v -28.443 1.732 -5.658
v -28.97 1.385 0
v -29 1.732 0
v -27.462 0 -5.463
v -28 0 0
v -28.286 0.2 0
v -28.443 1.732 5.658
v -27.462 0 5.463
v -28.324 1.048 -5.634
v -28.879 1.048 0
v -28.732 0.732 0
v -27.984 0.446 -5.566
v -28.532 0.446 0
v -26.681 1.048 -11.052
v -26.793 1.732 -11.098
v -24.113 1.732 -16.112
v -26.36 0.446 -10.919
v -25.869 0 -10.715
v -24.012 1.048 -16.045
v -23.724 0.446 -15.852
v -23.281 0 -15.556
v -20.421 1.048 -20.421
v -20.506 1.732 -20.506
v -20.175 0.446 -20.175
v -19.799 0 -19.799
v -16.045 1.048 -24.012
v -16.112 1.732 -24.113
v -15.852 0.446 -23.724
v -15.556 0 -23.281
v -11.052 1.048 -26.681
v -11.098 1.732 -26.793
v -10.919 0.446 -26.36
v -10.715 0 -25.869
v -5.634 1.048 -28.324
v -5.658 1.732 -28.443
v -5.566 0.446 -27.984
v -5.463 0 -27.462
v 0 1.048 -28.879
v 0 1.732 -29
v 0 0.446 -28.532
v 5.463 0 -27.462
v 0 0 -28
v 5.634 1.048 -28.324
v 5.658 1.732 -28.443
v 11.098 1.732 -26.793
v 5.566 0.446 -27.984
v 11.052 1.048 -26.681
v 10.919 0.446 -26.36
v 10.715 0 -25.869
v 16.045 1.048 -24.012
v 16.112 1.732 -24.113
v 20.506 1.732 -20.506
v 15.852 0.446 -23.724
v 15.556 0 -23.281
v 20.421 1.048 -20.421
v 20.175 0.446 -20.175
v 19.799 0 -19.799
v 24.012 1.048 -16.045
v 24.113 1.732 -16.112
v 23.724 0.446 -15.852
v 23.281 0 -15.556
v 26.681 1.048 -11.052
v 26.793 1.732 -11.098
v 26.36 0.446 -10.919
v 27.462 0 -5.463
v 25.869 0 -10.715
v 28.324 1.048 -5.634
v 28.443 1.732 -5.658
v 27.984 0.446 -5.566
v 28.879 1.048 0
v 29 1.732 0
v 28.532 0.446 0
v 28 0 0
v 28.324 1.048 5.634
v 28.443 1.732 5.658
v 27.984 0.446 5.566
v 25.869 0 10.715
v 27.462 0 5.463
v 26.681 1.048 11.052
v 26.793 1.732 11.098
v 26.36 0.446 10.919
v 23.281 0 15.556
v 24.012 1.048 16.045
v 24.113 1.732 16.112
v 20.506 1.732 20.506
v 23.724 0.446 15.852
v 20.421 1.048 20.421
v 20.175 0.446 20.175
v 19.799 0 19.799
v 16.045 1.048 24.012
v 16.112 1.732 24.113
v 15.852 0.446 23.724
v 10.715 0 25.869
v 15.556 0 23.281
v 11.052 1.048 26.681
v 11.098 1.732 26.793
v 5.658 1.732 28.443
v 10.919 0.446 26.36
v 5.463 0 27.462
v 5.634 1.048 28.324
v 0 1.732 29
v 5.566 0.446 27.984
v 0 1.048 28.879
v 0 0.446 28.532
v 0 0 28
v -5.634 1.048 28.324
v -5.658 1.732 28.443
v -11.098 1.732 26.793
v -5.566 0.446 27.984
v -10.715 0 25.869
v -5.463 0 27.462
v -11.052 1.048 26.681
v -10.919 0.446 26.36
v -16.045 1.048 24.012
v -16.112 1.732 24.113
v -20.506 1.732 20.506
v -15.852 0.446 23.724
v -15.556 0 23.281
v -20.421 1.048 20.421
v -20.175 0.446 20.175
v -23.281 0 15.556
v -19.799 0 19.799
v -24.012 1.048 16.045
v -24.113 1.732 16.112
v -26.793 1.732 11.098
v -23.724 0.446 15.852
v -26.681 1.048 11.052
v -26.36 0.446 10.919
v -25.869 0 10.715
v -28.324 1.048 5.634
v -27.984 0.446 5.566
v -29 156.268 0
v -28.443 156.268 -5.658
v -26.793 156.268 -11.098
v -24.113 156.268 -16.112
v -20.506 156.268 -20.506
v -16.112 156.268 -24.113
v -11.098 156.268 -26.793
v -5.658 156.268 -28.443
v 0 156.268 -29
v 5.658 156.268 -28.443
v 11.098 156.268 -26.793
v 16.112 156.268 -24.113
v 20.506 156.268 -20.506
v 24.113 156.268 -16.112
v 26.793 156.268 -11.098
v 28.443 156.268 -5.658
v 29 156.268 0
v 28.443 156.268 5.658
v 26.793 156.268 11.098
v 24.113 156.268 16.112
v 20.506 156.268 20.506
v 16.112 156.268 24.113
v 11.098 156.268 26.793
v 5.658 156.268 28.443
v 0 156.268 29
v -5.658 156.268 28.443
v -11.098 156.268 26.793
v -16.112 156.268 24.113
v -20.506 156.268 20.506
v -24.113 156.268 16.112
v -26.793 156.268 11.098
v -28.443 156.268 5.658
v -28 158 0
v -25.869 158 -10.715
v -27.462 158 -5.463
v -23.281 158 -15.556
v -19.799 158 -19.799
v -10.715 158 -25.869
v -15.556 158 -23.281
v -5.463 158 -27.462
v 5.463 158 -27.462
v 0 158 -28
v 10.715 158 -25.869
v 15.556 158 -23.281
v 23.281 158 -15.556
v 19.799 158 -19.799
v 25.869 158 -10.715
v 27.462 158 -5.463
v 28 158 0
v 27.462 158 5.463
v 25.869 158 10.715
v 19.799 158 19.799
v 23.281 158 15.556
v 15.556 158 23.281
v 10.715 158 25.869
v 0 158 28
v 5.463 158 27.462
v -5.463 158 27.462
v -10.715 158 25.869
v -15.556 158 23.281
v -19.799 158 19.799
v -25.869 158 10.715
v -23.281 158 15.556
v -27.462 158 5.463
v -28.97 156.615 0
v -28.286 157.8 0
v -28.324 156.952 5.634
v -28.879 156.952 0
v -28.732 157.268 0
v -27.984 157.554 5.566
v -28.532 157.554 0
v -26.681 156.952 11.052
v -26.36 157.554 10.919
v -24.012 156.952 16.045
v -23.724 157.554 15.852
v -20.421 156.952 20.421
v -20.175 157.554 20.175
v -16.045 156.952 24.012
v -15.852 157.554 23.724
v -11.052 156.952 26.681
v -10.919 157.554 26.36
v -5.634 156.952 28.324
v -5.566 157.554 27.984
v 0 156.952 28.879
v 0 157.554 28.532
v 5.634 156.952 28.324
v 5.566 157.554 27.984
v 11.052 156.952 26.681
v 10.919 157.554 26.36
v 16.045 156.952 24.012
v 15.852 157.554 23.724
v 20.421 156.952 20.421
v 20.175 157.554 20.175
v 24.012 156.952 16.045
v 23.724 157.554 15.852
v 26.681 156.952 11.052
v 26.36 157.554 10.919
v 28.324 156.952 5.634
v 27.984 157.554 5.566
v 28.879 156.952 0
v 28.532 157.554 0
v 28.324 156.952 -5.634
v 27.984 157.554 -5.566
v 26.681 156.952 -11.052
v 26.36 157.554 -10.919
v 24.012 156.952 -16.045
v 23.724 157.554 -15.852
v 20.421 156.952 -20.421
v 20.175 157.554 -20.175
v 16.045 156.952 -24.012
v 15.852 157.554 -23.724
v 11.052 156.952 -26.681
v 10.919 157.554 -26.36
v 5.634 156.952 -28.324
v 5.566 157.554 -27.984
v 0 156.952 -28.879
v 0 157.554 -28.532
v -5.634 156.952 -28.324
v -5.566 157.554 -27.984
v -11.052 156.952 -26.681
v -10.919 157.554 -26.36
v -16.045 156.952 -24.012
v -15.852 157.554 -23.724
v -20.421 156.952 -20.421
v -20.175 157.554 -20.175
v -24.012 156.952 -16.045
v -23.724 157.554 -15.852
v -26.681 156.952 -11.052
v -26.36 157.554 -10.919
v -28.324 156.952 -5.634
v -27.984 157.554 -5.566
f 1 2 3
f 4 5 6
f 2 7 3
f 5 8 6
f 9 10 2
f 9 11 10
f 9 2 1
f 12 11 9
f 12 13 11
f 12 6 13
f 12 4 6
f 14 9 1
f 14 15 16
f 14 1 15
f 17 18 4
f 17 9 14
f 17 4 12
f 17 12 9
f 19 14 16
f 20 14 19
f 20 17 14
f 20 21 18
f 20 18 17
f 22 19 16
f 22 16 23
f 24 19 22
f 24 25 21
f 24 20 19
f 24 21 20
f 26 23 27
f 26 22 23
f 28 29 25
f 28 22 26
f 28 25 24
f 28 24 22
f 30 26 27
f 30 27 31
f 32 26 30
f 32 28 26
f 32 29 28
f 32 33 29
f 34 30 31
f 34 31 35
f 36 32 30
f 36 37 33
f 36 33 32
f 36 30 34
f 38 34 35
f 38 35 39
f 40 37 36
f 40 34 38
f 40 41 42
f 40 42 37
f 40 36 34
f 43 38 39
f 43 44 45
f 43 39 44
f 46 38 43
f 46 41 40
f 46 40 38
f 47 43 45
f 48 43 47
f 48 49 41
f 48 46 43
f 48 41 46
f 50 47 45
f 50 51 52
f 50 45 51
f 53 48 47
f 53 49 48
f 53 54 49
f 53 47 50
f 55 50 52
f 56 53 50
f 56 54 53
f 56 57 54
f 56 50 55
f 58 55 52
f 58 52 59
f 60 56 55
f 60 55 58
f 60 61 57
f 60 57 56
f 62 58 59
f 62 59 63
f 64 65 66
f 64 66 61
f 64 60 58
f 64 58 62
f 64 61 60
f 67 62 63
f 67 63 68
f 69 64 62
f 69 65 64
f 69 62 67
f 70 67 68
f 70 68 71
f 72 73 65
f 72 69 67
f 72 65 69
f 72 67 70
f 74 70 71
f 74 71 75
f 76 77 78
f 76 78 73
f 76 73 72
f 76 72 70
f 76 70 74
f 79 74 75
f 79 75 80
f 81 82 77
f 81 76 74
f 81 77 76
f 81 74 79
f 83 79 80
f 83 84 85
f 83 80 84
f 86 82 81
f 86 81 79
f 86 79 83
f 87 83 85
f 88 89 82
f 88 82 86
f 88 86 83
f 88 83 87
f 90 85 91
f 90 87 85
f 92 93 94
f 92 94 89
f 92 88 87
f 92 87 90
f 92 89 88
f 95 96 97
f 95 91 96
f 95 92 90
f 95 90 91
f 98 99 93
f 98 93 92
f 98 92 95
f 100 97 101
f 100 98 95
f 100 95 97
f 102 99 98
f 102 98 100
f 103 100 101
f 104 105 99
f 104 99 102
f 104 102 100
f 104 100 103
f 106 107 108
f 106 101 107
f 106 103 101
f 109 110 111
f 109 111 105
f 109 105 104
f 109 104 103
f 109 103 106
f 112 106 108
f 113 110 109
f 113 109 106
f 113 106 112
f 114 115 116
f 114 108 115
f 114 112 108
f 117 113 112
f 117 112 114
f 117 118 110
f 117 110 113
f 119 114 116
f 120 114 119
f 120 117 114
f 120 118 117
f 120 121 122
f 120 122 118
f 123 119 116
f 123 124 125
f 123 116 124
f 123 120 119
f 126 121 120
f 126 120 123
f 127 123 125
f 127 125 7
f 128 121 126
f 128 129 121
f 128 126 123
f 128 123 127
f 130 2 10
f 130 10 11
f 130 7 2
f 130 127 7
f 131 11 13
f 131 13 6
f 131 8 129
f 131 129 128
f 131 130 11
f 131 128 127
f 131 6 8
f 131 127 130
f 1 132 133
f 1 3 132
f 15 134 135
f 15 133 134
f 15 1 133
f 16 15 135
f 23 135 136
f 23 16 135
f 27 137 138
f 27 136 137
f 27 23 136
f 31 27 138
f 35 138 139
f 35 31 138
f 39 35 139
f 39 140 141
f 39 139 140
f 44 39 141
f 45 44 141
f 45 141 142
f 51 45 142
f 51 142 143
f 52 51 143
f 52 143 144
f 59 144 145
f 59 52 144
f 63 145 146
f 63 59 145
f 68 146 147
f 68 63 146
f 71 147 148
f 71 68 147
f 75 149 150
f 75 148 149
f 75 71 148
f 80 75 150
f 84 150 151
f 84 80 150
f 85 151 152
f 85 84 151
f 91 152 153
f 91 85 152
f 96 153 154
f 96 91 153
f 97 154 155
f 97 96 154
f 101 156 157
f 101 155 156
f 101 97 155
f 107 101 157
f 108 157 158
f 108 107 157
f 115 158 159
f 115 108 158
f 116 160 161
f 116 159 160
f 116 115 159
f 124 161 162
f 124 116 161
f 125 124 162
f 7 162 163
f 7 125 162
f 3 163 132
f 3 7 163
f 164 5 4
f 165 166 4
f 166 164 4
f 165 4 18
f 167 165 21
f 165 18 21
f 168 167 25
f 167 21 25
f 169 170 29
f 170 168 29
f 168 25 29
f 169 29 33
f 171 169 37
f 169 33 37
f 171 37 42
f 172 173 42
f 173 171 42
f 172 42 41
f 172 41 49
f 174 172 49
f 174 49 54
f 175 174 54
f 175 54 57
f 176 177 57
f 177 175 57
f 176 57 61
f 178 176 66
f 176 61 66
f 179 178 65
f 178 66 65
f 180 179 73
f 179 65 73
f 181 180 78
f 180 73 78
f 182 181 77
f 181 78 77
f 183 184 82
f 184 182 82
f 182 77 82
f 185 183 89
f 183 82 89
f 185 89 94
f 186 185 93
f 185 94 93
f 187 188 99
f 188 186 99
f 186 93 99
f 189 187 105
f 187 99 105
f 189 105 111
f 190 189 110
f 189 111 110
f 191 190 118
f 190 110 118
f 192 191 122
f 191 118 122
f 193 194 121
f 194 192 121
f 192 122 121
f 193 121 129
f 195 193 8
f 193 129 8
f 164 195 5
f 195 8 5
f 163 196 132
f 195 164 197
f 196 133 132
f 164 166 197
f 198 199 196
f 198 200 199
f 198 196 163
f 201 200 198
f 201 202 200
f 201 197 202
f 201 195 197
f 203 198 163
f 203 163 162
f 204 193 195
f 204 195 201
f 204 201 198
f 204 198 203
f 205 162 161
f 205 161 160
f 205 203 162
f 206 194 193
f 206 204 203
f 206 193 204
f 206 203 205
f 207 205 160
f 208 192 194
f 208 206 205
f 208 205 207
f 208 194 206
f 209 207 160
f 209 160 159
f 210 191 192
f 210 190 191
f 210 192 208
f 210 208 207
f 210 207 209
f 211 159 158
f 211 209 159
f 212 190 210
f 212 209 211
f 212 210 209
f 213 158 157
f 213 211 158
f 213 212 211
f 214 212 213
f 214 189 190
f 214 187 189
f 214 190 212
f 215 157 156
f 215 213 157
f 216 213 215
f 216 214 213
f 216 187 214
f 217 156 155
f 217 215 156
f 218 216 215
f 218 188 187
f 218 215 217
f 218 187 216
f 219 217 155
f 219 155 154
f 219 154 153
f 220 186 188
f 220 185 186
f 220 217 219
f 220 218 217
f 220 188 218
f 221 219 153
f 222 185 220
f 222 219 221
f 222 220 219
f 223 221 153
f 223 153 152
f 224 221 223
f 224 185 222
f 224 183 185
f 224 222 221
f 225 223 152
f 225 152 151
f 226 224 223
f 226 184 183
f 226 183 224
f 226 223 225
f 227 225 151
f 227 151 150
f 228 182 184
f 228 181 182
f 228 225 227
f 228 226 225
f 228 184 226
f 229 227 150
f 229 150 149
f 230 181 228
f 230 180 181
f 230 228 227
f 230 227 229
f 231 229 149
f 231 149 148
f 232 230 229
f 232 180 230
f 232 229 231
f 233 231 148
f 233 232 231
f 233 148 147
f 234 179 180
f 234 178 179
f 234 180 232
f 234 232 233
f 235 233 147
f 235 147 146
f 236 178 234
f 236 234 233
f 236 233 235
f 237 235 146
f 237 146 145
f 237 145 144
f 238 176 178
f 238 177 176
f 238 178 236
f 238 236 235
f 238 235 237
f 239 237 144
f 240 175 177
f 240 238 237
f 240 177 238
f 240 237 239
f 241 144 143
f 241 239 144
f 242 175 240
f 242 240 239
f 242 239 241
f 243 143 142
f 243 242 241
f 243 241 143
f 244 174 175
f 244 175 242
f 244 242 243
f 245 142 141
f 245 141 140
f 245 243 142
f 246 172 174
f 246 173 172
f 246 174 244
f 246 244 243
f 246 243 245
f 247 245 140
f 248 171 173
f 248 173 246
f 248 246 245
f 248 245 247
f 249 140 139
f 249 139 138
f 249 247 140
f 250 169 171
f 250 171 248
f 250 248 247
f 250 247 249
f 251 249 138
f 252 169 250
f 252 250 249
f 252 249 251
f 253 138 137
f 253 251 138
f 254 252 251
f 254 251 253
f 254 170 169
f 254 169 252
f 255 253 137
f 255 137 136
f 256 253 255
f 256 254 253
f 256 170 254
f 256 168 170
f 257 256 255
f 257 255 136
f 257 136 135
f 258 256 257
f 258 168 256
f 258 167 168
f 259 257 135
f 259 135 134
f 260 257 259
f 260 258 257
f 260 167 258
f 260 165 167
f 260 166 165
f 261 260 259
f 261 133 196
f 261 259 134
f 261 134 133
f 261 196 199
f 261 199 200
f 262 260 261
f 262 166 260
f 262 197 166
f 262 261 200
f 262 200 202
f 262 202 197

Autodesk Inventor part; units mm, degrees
ref_plane "YZ Plane" through (0, 0, 0) normal (1, 0, 0) x (0, 1, 0)
ref_plane "XZ Plane" through (0, 0, 0) normal (0, 1, 0) x (-1, 0, 0)
ref_plane "XY Plane" through (0, 0, 0) normal (0, 0, 1) x (1, 0, 0)
sketch "Sketch2" plane through (0, 0, 0) normal (0, 1, 0) x (-1, 0, 0)
  circle A0 centre (0, 0) radius 29
  circle A1 centre (0, 0) radius 28
  dimension "d14" = 58
  dimension "d15" = 56
extrude "Extrusion2" add sketch "Sketch2" along normal blind 158
fillet "Fillet1" radius 2 1 edges at (29, 0, 0)
fillet "Fillet2" radius 2 1 edges at (29, 158, 0)
properties part number "snow_can_middle"
